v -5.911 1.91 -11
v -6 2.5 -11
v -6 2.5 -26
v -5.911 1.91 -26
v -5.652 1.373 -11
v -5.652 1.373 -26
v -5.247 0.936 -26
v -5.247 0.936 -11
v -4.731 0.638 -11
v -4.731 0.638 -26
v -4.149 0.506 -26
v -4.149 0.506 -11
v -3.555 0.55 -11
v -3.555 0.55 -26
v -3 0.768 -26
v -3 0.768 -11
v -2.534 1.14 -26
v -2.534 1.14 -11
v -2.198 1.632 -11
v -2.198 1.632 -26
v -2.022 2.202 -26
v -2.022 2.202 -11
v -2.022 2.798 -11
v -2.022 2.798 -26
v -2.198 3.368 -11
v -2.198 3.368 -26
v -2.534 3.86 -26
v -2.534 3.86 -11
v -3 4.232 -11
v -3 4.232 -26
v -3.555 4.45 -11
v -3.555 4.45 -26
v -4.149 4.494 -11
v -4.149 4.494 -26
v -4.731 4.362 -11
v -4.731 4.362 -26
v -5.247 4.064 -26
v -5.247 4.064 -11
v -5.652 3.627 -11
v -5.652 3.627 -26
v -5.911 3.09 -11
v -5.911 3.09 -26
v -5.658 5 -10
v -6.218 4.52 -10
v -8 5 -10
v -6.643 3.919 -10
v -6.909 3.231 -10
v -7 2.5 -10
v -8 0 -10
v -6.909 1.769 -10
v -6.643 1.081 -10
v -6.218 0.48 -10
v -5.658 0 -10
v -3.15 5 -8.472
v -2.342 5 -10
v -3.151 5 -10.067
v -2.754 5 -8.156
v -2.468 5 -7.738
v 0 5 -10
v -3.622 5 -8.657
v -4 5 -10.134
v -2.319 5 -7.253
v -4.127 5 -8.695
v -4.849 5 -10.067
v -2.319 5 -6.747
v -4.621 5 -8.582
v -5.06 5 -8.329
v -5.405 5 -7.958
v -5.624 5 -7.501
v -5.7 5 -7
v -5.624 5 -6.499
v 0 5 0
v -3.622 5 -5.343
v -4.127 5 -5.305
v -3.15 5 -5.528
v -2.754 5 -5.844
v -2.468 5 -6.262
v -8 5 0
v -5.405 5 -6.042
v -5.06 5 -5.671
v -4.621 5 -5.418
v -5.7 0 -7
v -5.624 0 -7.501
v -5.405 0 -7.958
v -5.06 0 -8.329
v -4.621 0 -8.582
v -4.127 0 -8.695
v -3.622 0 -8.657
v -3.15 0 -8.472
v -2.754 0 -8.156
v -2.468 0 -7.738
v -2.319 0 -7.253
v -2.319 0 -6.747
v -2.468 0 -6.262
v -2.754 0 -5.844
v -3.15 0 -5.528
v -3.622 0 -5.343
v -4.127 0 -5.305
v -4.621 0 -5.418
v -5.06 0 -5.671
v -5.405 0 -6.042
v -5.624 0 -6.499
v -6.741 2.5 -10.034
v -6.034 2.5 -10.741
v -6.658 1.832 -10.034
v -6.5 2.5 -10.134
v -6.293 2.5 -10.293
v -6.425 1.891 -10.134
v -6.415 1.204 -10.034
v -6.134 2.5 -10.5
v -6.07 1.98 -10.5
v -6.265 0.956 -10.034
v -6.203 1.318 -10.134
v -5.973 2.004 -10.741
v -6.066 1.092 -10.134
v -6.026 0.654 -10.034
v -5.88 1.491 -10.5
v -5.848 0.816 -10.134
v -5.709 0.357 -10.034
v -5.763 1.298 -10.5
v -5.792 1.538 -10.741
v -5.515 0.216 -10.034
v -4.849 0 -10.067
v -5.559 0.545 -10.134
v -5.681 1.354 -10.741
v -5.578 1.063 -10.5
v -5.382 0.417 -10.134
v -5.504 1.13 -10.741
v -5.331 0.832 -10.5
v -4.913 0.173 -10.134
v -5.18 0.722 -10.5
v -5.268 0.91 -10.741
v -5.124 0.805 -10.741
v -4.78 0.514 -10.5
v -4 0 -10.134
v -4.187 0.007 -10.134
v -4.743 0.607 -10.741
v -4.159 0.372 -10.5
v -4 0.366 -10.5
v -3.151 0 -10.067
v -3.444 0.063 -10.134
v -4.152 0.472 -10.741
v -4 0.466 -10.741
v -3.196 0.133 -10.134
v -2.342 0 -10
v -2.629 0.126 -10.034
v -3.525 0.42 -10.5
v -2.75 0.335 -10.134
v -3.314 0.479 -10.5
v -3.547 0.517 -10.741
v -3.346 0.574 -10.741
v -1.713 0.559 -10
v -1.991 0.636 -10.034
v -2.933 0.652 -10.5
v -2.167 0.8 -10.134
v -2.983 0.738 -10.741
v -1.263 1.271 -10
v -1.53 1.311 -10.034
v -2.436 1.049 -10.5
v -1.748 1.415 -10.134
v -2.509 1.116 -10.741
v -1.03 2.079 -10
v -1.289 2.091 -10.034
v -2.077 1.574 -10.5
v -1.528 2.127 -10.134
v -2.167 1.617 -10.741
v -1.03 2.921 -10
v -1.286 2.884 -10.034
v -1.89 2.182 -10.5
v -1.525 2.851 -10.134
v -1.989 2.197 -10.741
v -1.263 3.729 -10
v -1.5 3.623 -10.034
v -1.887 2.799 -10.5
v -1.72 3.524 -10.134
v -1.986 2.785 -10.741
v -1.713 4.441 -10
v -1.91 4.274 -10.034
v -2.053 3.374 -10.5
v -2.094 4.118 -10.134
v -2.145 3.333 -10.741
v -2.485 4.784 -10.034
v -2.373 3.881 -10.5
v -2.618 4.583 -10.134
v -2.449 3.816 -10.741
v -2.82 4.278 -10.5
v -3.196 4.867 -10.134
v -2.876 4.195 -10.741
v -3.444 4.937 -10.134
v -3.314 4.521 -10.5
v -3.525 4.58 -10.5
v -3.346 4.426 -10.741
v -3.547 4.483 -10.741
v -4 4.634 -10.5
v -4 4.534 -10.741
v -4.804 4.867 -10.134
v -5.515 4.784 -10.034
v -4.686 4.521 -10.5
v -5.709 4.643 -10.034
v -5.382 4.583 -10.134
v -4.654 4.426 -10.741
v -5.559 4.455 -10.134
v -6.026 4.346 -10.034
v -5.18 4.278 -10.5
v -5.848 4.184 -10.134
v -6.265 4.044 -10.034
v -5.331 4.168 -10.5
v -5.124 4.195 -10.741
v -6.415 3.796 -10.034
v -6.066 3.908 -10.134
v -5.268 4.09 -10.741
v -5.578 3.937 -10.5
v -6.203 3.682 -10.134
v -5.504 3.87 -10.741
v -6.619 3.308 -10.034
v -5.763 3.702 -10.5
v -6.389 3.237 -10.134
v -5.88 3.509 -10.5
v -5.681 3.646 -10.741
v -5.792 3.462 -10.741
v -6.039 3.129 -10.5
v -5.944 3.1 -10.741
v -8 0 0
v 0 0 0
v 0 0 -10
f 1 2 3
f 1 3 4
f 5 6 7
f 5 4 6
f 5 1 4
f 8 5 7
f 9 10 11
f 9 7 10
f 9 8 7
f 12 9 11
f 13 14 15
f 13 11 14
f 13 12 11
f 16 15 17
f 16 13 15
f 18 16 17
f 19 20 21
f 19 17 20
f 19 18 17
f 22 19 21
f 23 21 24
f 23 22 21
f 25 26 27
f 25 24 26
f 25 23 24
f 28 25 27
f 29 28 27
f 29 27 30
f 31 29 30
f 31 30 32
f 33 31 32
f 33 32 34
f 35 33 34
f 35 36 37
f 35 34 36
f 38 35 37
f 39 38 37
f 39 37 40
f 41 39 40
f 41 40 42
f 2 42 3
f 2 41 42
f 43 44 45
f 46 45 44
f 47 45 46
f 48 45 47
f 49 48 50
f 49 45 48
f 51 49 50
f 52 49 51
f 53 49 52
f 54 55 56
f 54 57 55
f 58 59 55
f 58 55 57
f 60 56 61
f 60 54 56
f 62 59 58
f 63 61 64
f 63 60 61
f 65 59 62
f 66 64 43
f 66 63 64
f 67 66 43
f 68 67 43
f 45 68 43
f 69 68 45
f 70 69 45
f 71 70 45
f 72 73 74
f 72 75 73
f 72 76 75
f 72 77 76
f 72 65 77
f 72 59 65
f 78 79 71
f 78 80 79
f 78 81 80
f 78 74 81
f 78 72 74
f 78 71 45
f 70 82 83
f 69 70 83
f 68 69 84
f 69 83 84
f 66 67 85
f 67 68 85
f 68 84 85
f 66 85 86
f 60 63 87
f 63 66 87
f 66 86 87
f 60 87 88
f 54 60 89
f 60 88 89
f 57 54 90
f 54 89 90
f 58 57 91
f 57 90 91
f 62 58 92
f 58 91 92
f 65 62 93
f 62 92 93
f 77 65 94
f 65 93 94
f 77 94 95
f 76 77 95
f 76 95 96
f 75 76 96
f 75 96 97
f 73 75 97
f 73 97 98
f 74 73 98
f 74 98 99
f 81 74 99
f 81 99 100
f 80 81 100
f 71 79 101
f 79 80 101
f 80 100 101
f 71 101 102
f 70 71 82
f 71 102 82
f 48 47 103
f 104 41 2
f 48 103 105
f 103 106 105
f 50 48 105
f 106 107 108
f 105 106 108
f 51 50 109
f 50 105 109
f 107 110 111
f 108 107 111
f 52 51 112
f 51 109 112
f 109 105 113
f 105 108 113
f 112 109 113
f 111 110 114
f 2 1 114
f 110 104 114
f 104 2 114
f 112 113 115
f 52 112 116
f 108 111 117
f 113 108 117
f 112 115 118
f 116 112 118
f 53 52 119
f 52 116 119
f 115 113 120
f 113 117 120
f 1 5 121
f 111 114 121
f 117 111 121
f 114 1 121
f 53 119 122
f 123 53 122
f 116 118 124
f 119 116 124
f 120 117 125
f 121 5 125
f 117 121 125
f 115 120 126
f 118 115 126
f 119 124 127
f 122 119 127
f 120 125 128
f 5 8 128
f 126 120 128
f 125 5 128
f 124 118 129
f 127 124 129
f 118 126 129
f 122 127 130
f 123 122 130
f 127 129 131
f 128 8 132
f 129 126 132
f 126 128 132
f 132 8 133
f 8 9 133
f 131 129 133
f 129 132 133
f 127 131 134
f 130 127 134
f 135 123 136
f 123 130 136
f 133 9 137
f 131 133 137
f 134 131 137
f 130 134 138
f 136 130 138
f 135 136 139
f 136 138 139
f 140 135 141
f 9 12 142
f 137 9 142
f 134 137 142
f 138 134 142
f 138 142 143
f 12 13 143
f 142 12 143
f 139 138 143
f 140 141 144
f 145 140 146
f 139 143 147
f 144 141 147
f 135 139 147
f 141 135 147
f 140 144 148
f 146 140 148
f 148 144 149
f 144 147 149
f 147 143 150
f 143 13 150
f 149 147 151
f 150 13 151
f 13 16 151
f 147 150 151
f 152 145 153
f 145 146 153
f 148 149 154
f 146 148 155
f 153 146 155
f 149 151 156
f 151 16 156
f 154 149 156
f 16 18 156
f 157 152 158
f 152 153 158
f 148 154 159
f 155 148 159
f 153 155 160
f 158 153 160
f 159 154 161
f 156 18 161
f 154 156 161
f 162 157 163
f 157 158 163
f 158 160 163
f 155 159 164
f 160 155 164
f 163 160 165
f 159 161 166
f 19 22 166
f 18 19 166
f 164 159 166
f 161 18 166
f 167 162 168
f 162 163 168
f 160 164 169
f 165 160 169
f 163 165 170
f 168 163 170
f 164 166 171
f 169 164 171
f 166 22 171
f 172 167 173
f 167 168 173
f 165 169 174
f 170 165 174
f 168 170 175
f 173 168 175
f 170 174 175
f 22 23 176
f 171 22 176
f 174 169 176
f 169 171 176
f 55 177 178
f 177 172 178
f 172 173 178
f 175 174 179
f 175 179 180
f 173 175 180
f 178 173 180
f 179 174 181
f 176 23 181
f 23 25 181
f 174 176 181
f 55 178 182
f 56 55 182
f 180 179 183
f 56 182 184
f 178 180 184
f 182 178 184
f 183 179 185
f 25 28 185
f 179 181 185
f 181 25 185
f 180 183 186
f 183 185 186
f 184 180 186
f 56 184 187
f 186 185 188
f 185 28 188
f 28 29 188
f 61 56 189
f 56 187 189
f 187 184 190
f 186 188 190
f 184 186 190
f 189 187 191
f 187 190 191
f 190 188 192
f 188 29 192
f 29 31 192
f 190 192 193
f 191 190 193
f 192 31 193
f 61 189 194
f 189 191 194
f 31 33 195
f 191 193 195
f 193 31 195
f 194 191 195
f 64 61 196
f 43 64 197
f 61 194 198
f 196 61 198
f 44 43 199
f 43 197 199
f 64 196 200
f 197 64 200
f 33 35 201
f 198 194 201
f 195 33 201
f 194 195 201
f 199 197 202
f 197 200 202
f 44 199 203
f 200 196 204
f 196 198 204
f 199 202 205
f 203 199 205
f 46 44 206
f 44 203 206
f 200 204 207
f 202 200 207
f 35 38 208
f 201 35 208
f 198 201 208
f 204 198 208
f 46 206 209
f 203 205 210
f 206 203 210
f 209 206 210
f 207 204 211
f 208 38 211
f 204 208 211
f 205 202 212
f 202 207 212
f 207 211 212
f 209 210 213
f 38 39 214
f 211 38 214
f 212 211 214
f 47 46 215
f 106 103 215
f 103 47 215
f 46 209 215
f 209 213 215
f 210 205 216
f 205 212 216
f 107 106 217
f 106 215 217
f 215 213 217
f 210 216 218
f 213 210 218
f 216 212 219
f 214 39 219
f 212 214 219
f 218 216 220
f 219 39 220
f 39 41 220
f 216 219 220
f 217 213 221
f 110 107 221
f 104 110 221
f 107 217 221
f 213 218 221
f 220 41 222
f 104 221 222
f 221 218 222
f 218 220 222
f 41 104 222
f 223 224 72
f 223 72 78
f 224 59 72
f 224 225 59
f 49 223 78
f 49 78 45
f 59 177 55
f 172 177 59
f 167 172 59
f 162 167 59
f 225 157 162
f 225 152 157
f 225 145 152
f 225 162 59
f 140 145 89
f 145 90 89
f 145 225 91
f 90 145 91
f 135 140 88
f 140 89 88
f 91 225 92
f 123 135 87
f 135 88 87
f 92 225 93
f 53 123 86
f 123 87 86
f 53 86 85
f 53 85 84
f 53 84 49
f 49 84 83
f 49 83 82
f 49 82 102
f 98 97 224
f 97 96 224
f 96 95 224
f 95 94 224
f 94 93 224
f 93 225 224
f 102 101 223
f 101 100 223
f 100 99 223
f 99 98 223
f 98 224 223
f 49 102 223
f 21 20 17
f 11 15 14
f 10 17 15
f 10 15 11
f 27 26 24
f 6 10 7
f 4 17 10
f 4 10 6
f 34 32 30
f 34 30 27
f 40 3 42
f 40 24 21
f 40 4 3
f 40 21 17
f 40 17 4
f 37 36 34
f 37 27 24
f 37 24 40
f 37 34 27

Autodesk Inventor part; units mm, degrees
ref_plane "YZ Plane" through (0, 0, 0) normal (1, 0, 0) x (0, 1, 0)
ref_plane "XZ Plane" through (0, 0, 0) normal (0, 1, 0) x (-1, 0, 0)
ref_plane "XY Plane" through (0, 0, 0) normal (0, 0, 1) x (1, 0, 0)
sketch "Esquisse7" plane through (0, 0, 0) normal (0, 1, 0) x (-1, 0, 0)
  line L0 (0, 0) -> (8, 0)
  line L1 (8, 0) -> (8, -10)
  line L2 (8, -10) -> (0, -10)
  line L3 (0, -10) -> (0, 0)
  line L4 (4, -10) -> (4, 0) construction
  circle A0 centre (4, -7) radius 1.7
  dimension "d15" = 3.4
  dimension "d16" = 10
  dimension "d17" = 8
  dimension "d24" = 3
extrude "Extrusion5" add sketch "Esquisse7" along normal blind 5
sketch "Esquisse8" plane through (0, 0, -10) normal (0, 0, -1) x (-1, 0, 0)
  line L0 (8, 5) -> (0, 5) construction
  line L1 (4, 5) -> (4, 0) construction
  line L2 (0, 0) -> (8, 0) construction
  circle A0 centre (4, 2.5) radius 2
  dimension "d20" = 4
extrude "Extrusion6" add sketch "Esquisse8" along normal blind 16
fillet "Congé3" radius 1 1 edges at (-2, 2.5, -10)
sketch "Esquisse9" plane through (-4, 2.5, -26) normal (0, 0, -1) x (-1, 0, 0)
  circle A0 centre (0, 0) radius 2 projected
  arc A1 (-1.6583, 2.5) -> (-1.6583, -2.5) centre (0, 0) ccw projected
  arc A2 (-1.6583, 2.5) -> (-1.6583, -2.5) centre (0, 0) ccw projected
  line L0 (-4, 2.5) -> (-1.6583, 2.5) projected
  line L1 (-4, -2.5) -> (-4, 2.5) projected
  line L2 (-1.6583, -2.5) -> (-4, -2.5) projected
  point P0 (-4, -2.5)
properties part number "charniere"
